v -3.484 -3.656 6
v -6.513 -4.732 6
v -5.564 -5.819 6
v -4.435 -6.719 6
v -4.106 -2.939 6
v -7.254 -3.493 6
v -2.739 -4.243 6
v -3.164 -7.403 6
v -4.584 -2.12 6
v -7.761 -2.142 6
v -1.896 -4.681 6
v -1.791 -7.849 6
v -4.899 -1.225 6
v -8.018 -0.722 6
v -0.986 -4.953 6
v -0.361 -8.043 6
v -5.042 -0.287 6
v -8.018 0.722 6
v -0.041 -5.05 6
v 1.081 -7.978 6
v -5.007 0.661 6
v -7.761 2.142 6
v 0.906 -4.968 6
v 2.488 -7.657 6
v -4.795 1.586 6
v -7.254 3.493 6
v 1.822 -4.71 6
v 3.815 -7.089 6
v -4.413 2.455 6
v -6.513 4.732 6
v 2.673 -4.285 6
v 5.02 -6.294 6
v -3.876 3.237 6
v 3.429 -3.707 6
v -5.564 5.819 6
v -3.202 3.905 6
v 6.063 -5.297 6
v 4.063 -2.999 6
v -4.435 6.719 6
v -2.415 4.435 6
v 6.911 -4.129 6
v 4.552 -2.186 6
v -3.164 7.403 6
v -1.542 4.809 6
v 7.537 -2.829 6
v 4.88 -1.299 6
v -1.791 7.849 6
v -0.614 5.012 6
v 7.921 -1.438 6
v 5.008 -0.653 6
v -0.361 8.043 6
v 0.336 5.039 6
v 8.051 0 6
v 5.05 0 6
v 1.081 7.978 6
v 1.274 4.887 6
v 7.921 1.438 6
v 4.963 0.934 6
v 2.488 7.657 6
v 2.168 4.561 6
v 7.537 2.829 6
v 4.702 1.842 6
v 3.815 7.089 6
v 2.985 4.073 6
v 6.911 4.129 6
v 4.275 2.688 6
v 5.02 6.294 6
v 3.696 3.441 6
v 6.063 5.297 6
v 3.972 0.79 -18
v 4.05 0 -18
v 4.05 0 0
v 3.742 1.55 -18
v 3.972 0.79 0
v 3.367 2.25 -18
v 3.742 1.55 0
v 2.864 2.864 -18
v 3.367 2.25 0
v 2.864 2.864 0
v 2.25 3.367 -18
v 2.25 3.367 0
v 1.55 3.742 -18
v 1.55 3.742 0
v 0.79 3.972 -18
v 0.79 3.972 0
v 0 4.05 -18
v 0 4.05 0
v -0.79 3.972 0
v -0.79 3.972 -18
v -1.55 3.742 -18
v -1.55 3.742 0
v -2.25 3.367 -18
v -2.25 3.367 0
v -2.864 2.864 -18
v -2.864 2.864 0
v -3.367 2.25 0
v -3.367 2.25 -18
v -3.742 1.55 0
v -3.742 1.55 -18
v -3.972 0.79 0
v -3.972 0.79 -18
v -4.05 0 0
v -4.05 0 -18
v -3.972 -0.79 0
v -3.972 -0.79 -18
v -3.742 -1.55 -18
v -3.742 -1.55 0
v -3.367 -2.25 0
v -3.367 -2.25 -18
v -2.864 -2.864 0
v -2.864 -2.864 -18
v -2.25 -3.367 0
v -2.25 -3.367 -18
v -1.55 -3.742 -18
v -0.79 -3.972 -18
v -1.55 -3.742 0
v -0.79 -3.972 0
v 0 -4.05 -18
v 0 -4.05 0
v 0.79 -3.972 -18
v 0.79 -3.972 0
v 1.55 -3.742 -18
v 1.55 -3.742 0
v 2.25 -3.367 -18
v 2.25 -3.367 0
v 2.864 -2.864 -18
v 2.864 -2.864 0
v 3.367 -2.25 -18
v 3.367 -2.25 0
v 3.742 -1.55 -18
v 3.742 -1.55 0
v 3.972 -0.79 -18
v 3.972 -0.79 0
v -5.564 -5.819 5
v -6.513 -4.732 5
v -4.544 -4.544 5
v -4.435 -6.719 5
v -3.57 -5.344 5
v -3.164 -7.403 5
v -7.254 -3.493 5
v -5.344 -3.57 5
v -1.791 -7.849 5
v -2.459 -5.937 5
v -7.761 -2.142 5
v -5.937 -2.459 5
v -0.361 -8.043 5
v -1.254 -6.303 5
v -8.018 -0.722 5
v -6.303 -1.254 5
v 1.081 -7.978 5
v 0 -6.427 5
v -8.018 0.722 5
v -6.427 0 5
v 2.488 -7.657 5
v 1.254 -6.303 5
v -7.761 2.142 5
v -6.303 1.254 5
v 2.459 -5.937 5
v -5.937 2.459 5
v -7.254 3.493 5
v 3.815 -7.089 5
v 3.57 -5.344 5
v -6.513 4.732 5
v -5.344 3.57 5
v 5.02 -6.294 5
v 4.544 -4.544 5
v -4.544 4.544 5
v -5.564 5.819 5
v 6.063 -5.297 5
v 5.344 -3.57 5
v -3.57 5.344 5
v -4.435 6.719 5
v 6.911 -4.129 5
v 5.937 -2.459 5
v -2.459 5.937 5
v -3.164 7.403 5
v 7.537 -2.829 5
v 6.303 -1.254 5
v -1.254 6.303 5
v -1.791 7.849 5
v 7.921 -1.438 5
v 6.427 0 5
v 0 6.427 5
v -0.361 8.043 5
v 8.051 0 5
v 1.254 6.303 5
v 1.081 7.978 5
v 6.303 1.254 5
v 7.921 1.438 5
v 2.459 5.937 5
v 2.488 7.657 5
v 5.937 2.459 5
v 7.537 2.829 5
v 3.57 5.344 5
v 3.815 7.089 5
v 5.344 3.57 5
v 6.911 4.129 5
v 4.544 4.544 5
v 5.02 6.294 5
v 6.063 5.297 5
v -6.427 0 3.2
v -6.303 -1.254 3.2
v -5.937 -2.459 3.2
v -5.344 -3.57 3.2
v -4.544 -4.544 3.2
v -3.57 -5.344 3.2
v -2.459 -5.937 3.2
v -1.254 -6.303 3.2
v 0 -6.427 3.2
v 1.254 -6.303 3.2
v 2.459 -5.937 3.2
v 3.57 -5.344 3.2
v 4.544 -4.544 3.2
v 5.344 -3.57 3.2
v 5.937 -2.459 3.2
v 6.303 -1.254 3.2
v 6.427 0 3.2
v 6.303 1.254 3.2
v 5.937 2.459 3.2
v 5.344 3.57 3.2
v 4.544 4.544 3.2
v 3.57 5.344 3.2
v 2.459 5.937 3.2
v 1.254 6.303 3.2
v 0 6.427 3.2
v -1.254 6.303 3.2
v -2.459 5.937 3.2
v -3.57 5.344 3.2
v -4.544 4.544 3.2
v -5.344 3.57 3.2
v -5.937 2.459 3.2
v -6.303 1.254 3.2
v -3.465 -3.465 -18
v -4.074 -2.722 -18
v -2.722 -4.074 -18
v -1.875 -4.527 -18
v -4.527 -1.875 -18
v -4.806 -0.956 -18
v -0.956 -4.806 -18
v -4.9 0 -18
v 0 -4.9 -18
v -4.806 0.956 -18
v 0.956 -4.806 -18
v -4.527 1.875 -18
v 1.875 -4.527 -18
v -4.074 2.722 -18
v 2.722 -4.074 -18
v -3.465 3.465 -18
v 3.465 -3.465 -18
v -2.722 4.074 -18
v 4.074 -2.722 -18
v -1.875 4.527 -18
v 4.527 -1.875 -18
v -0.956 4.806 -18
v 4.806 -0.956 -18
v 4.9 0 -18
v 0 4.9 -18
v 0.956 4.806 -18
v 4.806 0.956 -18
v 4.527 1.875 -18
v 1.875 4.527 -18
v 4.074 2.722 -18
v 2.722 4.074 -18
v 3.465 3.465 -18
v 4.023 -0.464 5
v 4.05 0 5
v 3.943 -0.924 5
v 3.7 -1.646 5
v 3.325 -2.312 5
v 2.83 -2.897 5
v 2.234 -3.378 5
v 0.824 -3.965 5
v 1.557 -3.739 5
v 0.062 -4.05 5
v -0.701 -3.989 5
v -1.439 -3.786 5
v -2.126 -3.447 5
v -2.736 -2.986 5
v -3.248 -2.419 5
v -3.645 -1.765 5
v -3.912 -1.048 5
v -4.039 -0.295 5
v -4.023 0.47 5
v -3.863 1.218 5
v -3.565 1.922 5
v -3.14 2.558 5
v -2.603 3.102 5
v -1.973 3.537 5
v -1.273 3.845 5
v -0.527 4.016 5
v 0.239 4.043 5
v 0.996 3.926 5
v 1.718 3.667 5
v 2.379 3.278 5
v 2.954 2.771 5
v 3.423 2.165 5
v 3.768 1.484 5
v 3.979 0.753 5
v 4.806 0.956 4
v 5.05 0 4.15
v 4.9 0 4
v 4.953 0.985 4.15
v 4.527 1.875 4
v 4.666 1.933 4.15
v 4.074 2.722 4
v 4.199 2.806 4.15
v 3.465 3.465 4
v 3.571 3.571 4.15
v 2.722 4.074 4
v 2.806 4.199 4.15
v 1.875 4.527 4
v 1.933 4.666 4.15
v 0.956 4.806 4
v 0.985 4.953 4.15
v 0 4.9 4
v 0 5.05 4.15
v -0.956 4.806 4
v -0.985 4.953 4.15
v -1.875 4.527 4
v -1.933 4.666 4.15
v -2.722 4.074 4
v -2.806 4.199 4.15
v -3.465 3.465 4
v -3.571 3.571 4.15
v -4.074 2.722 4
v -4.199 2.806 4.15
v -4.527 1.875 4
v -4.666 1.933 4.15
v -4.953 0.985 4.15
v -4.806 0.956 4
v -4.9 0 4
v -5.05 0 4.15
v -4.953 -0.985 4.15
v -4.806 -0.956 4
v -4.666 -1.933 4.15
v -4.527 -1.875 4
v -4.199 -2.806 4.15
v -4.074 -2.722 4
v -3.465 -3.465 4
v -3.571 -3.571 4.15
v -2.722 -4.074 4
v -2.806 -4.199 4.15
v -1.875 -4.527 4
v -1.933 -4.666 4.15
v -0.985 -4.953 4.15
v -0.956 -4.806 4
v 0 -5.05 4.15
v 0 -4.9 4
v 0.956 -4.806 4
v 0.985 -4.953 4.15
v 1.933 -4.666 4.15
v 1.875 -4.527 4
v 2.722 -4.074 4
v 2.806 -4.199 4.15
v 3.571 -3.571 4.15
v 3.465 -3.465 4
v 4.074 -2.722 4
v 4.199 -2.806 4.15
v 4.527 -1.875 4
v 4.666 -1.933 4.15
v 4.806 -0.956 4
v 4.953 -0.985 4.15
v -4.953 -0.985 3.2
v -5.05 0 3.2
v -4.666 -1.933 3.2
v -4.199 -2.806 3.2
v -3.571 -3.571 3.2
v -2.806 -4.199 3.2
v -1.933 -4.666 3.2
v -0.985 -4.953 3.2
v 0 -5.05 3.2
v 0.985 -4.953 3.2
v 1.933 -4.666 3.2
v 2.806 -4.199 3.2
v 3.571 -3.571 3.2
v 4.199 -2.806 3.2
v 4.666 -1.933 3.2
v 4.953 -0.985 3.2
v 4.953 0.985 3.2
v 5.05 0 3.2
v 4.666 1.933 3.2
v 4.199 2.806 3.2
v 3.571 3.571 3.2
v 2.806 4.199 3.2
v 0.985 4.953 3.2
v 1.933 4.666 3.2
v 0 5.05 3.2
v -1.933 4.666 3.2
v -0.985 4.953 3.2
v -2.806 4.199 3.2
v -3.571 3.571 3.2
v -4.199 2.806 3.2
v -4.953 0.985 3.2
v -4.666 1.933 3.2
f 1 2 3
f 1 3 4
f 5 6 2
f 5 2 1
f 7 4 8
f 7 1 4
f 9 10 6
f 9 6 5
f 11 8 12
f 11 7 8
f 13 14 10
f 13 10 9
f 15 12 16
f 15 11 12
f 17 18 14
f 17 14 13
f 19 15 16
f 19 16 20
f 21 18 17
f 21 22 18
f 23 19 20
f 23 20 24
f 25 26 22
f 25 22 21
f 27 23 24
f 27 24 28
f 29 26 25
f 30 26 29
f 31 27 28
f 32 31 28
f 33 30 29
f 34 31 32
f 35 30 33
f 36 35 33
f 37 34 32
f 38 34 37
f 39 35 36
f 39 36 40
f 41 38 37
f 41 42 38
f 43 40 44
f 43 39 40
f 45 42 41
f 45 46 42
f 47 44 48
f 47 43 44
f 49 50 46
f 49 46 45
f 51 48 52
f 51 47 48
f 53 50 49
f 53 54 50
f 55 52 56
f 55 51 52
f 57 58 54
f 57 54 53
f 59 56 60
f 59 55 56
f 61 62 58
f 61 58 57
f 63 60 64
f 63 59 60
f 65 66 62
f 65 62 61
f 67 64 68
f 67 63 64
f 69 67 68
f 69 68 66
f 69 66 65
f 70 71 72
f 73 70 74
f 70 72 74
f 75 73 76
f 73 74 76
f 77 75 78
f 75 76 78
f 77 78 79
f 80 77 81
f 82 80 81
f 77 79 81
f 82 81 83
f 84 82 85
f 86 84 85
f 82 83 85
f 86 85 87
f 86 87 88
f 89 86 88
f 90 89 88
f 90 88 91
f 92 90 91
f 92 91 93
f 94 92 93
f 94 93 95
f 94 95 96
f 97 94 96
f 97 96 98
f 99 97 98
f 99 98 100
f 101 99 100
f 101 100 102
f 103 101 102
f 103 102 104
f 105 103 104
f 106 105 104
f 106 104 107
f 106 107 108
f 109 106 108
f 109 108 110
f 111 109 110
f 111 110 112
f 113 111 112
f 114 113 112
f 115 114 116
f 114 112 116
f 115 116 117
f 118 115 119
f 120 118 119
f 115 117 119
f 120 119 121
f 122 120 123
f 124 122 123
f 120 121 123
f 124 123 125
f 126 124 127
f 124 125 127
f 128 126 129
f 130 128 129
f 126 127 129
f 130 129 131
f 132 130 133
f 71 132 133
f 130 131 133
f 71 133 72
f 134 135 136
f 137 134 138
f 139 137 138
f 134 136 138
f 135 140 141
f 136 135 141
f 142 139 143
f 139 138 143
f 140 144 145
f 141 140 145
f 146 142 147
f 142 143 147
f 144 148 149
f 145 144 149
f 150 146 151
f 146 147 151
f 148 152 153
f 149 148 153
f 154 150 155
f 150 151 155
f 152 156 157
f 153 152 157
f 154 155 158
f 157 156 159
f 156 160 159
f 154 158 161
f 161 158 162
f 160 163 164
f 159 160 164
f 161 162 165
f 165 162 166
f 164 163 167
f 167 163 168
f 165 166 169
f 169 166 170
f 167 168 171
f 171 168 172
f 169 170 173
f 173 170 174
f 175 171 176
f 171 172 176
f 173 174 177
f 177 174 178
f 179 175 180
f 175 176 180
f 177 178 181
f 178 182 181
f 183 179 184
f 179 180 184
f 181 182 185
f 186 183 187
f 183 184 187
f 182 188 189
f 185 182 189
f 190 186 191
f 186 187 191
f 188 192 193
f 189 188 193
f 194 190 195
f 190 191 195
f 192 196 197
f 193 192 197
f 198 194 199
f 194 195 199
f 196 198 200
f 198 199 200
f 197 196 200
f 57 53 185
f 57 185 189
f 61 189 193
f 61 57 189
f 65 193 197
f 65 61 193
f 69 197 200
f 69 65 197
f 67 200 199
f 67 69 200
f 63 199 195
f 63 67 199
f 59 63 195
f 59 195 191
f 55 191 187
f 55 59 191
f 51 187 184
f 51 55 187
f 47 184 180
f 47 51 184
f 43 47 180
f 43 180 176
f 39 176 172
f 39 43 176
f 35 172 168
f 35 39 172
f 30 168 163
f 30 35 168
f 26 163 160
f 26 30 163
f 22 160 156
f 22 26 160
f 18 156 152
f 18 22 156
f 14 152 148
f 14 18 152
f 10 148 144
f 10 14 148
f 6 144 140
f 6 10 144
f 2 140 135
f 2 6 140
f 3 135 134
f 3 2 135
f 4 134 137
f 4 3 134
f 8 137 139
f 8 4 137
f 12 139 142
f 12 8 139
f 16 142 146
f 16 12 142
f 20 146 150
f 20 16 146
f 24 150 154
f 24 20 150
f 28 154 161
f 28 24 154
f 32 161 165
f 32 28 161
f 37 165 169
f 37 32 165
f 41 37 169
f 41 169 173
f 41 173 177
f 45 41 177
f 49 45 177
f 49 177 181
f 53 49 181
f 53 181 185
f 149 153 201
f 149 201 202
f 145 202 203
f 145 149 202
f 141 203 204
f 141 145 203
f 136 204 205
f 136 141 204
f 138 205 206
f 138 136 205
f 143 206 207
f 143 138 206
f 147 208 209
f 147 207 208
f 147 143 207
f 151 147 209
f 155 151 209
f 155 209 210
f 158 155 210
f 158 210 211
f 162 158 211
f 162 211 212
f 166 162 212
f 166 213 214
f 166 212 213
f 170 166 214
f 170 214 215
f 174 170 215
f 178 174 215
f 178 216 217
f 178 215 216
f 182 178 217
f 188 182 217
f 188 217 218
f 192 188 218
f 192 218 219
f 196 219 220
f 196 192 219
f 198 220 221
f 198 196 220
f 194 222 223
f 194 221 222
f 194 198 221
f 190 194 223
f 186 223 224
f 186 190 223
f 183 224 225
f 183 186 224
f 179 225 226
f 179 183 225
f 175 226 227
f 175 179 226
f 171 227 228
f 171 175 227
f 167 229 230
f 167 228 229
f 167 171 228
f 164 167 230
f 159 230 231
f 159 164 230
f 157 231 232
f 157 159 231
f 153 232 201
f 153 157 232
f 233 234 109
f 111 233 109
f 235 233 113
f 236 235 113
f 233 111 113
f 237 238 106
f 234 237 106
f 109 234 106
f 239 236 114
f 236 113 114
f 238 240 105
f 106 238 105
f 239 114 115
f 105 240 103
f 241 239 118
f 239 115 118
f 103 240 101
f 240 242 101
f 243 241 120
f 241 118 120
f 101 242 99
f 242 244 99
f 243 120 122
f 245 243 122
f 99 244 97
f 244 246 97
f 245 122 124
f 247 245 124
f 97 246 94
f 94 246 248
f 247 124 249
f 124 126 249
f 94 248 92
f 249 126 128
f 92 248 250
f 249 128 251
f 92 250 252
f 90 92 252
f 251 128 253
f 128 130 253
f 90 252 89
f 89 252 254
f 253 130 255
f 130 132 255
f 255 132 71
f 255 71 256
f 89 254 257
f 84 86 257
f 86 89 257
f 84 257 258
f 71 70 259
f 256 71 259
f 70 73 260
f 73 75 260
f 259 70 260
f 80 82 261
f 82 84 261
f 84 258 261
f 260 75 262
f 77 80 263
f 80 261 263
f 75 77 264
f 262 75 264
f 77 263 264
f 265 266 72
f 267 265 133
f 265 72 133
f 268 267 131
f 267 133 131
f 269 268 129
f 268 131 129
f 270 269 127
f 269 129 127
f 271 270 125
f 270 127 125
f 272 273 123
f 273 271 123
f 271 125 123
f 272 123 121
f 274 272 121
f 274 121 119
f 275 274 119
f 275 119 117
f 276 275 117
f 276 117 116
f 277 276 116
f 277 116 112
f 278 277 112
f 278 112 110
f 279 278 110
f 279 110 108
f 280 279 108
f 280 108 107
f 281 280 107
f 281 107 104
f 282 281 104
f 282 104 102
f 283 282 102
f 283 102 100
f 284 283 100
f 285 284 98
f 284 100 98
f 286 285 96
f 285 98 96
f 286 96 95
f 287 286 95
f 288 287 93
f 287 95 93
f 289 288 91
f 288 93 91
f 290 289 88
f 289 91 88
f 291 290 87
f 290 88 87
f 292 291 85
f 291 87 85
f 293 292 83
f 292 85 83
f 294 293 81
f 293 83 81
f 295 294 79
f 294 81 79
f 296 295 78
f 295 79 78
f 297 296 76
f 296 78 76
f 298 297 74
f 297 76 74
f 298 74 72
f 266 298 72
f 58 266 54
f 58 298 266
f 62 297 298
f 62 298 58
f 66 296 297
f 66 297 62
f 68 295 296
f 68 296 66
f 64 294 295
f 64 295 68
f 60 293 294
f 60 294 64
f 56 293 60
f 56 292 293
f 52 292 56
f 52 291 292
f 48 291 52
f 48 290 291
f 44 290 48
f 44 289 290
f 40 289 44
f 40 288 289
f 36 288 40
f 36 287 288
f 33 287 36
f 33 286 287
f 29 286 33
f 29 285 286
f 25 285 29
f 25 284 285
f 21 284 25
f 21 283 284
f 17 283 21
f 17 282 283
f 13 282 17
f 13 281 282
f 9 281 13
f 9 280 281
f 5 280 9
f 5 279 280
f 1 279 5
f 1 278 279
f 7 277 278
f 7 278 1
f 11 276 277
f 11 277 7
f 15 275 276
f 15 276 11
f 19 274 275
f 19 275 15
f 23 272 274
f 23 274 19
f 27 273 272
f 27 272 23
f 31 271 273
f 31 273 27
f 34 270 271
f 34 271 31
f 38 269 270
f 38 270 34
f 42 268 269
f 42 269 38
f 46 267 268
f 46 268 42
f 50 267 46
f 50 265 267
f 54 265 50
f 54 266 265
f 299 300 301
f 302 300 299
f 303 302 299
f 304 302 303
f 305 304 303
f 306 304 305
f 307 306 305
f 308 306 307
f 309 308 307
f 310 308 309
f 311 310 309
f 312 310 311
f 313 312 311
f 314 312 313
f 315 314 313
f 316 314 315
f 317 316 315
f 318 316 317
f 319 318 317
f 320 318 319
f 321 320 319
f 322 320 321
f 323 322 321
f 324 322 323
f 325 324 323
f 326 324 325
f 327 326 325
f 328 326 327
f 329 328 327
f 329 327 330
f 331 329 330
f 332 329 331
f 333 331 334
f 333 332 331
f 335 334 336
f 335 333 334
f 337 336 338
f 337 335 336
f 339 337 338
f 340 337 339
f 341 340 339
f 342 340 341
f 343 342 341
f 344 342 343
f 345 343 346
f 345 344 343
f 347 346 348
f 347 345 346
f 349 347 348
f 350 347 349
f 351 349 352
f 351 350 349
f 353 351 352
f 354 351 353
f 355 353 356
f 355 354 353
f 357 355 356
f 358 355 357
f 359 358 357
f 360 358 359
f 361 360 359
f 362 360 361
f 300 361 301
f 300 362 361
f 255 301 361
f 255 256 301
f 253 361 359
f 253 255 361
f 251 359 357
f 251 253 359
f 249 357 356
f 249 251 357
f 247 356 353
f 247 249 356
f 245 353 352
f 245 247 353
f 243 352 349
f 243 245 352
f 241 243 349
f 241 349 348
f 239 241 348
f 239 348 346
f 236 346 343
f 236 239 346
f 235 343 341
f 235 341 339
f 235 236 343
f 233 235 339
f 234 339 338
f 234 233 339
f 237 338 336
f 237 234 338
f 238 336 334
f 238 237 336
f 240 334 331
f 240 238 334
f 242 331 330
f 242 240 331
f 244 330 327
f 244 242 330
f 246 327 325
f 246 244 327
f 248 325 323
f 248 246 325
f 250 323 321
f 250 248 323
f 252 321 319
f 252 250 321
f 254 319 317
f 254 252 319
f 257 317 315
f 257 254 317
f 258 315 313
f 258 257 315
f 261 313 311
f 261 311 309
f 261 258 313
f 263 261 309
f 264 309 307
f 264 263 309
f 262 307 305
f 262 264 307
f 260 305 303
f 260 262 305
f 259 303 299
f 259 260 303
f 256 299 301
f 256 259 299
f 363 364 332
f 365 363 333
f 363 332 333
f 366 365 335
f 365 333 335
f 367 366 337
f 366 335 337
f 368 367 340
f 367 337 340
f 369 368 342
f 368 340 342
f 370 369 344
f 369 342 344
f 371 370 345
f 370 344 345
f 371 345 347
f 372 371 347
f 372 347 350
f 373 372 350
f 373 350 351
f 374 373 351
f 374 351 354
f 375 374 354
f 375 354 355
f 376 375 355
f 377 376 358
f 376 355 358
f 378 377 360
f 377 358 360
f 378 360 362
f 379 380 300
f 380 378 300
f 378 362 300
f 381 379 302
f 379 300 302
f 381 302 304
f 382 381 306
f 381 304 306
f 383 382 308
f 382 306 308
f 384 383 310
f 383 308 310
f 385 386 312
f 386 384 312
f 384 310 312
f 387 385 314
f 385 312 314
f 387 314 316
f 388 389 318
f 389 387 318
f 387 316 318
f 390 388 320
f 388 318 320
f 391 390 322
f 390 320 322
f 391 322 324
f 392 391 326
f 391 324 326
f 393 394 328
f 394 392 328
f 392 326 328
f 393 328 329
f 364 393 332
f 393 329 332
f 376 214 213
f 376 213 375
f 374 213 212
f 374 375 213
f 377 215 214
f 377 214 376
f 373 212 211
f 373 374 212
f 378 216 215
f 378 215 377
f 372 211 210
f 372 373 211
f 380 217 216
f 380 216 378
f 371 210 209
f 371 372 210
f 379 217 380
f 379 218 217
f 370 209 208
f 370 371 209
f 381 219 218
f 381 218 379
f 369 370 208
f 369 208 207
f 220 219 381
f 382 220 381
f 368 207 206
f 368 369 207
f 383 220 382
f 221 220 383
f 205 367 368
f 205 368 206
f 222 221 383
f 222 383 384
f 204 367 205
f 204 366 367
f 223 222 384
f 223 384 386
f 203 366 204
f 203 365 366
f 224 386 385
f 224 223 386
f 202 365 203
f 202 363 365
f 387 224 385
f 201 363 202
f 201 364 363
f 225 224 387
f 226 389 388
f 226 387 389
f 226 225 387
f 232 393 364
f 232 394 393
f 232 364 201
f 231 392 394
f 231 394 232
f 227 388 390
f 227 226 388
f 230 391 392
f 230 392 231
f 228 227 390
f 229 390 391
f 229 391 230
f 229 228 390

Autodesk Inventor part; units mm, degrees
ref_plane "YZ Plane" through (0, 0, 0) normal (1, 0, 0) x (0, 1, 0)
ref_plane "XZ Plane" through (0, 0, 0) normal (0, 1, 0) x (-1, 0, 0)
sketch "Skizze1" plane through (0, 0, 0) normal (0, 0, 1) x (1, 0, 0)
  arc A0 (-2.8009, 5.3061) -> (2.8009, 5.3061) centre (0, 0) ccw projected
  circle A1 centre (0, 0) radius 5 projected
  circle A2 centre (0, 0) radius 4.9
  circle A3 centre (0, 0) radius 4.05
  point P0 (0, 0)
  dimension "d0" = 0.1
  dimension "d1" = 8.1
extrude "Extrusion1" add sketch "Skizze1" along normal blind 6 and the other way blind 18 contours A2
sketch "Skizze2" plane through (0, 0, 6) normal (0, 0, 1) x (1, 0, 0)
  circle A0 centre (0, 0) radius 4.9 projected
  circle A1 centre (0, 0) radius 8.5508 projected
  circle A2 centre (0, 0) radius 7.7 projected
  circle A3 centre (0, 0) radius 8.0508
  point P0 (0, 0)
  dimension "d4" = 0.5
extrude "Extrusion2" add sketch "Skizze2" against normal blind 1 contours A2 | A3
chamfer "Fase1" distance 1 angle 45 2 edges at (-4.9, 0, 5) (-4.05, 0, 6)
sketch "Skizze3" plane through (0, 0, 5) normal (0, 0, -1) x (-1, 0, 0)
  circle A0 centre (0, 0) radius 4.9 projected
  circle A1 centre (0, 0) radius 5.05 projected
  circle A2 centre (0, 0) radius 4.1058
  circle A3 centre (0, 0) radius 6.4267
  point P0 (0, 0)
ref_plane "Arbeitsebene1" through (-19.3, -19.3, 3.2) normal (0, 0, 1) x (1, 0, 0)
extrude "Extrusion3" add sketch "Skizze3" along normal up to surface (1.8 mm away)
properties part number "50_ETL_Motionpart1_v0"
